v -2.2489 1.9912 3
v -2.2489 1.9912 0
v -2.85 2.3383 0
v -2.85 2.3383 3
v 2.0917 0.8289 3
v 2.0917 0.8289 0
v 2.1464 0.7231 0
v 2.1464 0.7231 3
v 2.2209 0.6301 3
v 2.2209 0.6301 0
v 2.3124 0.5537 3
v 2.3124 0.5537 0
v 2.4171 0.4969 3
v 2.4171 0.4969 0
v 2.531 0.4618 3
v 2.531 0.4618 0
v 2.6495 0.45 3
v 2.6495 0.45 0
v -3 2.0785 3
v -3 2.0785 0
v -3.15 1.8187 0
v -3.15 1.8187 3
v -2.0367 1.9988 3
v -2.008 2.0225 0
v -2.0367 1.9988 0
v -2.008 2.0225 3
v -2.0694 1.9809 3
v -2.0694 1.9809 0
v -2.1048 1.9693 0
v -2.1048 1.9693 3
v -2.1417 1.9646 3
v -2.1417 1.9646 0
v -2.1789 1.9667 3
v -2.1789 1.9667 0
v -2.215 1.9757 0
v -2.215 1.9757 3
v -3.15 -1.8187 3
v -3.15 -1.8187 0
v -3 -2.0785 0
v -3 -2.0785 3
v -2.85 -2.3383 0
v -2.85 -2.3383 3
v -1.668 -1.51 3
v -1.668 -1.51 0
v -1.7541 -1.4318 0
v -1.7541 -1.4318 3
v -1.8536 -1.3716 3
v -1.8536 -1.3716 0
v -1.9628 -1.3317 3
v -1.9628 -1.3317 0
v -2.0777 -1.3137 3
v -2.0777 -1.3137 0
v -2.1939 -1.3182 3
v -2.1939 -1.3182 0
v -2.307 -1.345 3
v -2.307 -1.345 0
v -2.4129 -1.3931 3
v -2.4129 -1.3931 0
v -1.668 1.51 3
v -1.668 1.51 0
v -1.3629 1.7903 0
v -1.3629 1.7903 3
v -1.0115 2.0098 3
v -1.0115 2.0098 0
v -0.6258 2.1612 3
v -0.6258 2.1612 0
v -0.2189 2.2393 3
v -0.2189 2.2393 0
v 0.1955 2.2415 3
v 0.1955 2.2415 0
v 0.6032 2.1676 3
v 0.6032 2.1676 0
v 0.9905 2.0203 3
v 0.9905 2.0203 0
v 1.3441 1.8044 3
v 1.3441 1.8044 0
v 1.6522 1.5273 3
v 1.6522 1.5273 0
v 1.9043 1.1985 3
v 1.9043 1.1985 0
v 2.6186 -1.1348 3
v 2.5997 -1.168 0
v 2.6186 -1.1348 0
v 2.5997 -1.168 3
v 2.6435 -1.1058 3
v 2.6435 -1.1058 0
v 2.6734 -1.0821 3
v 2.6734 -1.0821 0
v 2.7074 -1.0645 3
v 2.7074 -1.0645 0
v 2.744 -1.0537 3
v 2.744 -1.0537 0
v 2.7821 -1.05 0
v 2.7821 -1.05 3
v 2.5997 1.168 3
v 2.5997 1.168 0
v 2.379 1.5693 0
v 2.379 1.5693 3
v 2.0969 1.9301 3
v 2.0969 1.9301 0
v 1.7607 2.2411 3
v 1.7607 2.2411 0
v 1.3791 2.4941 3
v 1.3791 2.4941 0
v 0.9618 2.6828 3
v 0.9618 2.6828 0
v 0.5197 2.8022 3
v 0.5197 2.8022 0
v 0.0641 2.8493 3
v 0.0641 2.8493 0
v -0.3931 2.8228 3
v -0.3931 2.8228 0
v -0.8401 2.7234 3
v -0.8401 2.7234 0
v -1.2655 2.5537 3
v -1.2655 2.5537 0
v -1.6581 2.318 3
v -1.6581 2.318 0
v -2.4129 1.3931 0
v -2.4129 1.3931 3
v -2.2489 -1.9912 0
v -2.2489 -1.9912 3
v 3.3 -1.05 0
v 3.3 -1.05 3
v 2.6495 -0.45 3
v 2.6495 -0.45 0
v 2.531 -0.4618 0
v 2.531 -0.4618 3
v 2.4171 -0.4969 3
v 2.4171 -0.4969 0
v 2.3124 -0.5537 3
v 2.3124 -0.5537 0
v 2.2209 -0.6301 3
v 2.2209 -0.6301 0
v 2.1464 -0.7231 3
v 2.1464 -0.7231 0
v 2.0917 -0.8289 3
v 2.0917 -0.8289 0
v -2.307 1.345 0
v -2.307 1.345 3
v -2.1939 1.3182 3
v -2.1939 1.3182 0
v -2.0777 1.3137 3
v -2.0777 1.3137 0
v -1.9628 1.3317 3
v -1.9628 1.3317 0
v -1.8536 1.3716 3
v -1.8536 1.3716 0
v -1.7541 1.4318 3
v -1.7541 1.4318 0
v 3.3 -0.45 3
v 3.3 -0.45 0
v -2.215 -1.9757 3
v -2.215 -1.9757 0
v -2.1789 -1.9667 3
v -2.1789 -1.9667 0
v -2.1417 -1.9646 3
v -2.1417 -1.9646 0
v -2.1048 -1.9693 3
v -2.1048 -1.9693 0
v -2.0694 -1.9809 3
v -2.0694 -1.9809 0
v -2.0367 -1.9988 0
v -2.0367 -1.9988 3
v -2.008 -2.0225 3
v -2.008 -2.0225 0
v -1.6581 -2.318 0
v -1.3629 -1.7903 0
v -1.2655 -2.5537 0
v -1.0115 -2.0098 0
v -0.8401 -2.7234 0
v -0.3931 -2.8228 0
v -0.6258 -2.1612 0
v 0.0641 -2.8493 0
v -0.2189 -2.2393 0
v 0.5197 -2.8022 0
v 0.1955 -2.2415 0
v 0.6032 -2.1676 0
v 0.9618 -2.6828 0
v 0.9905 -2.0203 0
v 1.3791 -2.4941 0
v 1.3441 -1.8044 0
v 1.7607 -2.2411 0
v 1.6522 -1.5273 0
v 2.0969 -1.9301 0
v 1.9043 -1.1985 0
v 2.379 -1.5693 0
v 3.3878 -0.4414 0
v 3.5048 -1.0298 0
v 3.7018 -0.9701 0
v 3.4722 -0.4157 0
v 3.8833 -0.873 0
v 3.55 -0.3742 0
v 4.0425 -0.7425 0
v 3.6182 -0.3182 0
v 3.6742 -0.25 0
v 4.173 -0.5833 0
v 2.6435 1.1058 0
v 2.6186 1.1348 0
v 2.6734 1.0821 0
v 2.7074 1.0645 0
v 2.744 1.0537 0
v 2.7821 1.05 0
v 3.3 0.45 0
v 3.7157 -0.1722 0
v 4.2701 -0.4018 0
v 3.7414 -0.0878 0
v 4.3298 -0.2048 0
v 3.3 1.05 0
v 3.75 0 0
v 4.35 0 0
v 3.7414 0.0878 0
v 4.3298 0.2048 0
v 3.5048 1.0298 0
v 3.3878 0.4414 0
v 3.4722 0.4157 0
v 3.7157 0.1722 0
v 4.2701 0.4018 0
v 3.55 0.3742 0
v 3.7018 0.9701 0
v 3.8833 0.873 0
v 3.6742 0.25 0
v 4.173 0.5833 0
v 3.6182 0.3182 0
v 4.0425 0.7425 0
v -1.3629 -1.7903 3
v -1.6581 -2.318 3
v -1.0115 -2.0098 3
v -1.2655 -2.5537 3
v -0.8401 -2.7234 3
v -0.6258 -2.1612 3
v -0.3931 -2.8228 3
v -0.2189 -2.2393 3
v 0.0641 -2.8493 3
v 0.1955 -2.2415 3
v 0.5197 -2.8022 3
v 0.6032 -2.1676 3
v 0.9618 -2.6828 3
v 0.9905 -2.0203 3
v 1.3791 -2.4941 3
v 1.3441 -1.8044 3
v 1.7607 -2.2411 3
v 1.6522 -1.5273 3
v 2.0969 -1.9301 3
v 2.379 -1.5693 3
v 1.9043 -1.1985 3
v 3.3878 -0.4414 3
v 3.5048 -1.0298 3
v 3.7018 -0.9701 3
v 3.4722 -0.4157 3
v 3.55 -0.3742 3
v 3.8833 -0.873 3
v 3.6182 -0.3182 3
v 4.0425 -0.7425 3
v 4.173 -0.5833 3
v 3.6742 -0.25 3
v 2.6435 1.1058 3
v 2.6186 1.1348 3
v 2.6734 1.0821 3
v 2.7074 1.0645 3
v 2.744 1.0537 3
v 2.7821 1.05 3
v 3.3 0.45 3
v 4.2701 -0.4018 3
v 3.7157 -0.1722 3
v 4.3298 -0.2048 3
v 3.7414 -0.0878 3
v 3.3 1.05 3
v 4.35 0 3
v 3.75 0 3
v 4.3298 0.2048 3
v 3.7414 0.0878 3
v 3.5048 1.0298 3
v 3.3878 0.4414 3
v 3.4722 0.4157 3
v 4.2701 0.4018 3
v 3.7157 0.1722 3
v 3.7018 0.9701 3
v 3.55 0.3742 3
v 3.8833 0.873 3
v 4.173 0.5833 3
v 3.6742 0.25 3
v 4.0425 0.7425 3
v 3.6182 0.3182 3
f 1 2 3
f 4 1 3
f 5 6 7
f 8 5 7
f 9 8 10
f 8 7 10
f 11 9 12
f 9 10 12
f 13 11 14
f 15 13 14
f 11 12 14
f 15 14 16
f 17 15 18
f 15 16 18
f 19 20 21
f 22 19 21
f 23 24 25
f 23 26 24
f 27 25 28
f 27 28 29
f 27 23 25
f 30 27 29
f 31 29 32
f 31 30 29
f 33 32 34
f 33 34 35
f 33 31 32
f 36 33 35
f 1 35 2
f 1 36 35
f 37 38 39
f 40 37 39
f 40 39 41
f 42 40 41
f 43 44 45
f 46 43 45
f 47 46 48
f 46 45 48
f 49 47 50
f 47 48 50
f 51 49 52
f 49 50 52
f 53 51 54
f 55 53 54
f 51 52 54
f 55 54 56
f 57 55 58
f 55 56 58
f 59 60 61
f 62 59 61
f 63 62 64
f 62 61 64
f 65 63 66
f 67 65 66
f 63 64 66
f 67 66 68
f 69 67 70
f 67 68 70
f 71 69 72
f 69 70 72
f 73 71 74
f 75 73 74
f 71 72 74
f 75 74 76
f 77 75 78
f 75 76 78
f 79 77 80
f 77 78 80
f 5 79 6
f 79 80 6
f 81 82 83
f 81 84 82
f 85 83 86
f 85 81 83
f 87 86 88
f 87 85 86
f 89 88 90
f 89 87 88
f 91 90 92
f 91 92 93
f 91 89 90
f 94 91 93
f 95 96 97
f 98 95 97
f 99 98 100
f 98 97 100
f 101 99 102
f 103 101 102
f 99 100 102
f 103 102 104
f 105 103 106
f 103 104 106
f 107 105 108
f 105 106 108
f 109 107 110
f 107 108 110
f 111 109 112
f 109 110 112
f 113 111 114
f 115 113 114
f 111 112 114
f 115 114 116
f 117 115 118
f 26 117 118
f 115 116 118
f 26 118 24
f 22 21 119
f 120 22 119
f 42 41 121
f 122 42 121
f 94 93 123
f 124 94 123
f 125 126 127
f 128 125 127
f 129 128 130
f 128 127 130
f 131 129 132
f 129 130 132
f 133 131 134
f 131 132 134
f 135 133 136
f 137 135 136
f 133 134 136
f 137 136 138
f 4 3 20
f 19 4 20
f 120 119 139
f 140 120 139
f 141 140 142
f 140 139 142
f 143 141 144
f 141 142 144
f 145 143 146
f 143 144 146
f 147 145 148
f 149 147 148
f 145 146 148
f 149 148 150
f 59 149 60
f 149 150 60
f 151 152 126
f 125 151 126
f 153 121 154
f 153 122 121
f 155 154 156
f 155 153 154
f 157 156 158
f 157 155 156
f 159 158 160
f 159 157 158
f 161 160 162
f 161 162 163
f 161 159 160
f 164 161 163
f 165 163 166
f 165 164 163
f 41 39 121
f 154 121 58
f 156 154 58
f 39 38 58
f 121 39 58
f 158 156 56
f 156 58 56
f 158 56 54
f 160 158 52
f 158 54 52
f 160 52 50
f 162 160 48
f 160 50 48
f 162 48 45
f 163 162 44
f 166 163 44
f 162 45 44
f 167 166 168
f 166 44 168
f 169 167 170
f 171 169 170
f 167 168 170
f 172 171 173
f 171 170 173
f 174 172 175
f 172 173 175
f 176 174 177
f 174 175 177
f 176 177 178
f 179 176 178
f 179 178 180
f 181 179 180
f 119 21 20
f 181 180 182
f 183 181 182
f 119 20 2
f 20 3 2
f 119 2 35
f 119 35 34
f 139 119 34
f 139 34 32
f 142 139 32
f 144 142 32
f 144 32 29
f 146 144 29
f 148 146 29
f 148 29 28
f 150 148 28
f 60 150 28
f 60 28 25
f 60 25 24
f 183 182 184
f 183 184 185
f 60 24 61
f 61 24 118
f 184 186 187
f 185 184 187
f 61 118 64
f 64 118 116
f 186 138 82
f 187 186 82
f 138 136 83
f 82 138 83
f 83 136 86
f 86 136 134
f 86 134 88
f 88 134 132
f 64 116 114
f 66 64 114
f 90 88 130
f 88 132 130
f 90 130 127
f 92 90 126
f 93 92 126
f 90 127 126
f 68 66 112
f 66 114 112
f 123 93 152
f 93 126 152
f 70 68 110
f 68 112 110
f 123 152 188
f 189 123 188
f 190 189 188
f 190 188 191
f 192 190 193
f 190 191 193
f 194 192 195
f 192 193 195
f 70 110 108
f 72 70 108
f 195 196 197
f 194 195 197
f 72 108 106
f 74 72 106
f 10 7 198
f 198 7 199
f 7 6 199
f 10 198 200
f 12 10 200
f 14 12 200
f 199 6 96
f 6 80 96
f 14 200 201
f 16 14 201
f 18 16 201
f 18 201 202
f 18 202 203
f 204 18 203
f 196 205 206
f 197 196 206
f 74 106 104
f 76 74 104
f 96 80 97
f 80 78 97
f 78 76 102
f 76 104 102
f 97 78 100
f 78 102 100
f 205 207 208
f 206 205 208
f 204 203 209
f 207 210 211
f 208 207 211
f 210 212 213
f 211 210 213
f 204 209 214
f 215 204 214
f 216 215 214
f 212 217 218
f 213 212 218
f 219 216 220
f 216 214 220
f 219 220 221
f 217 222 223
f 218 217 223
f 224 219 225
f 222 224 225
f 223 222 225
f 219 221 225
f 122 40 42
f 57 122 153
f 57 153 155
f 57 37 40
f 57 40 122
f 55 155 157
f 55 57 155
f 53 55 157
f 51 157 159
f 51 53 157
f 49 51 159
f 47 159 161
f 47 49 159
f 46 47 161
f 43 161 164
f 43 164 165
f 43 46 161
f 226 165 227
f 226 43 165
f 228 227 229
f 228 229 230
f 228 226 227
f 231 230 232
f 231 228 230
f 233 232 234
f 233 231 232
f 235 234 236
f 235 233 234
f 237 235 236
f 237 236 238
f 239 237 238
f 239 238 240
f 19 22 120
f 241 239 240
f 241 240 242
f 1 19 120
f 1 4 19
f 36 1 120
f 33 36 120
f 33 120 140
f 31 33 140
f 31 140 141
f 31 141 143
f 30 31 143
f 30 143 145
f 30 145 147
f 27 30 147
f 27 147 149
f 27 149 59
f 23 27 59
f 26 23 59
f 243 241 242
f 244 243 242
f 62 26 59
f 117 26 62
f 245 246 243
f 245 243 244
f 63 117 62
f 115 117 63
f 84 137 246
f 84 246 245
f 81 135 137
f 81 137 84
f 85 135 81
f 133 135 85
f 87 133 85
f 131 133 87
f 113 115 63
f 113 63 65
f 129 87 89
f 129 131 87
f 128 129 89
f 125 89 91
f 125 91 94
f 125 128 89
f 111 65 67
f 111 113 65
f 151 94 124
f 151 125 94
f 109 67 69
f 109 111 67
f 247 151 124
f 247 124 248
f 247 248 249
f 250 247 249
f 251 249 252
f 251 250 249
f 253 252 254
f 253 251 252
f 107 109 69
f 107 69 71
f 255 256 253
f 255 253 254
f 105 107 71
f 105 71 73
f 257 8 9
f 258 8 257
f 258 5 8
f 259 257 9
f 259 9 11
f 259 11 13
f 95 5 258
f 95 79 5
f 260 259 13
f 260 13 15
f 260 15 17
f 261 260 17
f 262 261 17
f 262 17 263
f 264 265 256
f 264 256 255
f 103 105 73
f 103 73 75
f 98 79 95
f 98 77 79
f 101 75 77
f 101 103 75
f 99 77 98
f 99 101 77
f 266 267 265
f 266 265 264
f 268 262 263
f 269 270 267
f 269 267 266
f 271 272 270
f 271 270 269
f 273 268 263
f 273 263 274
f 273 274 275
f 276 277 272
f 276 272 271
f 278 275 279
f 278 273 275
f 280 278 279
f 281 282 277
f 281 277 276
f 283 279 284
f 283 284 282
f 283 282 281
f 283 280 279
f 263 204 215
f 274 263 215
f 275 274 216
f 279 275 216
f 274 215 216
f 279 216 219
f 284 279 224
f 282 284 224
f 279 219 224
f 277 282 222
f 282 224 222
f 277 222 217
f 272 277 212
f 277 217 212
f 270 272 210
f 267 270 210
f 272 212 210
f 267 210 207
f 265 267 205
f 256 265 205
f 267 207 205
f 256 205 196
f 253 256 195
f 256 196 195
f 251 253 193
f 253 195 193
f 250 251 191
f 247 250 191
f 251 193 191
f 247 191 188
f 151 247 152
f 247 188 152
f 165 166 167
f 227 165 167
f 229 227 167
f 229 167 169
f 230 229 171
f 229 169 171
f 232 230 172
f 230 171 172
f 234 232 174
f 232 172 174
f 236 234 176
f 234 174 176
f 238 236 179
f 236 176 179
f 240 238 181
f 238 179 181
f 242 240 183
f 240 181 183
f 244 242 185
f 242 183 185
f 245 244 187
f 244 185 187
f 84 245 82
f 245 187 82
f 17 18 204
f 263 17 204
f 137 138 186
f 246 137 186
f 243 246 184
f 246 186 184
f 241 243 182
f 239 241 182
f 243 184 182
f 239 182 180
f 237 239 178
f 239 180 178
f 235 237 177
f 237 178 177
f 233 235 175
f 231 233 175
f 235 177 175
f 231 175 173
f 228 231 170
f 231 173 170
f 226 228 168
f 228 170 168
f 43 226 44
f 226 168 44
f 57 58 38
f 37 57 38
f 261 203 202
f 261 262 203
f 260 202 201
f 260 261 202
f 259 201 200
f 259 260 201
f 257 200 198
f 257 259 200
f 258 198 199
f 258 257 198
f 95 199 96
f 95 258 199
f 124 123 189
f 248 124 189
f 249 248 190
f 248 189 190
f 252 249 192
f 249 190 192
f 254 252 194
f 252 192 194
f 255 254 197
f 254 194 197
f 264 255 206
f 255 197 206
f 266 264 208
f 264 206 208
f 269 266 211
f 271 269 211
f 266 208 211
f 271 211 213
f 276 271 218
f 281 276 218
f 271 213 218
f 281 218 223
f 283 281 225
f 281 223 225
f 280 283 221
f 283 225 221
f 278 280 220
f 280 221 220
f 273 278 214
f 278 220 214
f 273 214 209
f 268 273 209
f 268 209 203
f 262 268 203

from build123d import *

# Parameters (mm, degrees)
F1_DEPTH = 1
F2_SCALE = 3
F3_R     = 0.2


with BuildPart() as f1:
    # F0 (on Top) → F1 (new body)
    with BuildSketch(Plane.XY):
        with BuildLine():
            ThreePointArc((-0.5560147872, 0.5033364247), (0.1336825888, 0.7379898139), (0.6972442789, 0.2763157895))
            ThreePointArc((0.6972442789, 0.2763157895), (0.7707857892, 0.1845659616), (0.8831760866, 0.15))
            Line((0.8831760866, 0.15), (1.1, 0.15))
            ThreePointArc((1.1, 0.15), (1.25, 0), (1.1, -0.15))
            Line((1.1, -0.15), (0.8831760866, -0.15))
            ThreePointArc((0.8831760866, -0.15), (0.7707857892, -0.1845659616), (0.6972442789, -0.2763157895))
            ThreePointArc((0.6972442789, -0.2763157895), (0.1336825888, -0.7379898139), (-0.5560147872, -0.5033364247))
            ThreePointArc((-0.5560147872, -0.5033364247), (-0.6732626201, -0.4399801523), (-0.8042853971, -0.4643543905))
            Line((-0.8042853971, -0.4643543905), (-1.05, -0.6062177826))
            Line((-1.05, -0.6062177826), (-1, -0.692820323))
            Line((-1, -0.692820323), (-0.7542853971, -0.5509569309))
            ThreePointArc((-0.7542853971, -0.5509569309), (-0.6887740086, -0.5387698118), (-0.6301500921, -0.570447948))
            ThreePointArc((-0.6301500921, -0.570447948), (0.1515069339, -0.8363884558), (0.7902101828, -0.3131578947))
            ThreePointArc((0.7902101828, -0.3131578947), (0.8269809379, -0.2672829808), (0.8831760866, -0.25))
            Line((0.8831760866, -0.25), (1.1, -0.25))
            ThreePointArc((1.1, -0.25), (1.35, 0), (1.1, 0.25))
            Line((1.1, 0.25), (0.8831760866, 0.25))
            ThreePointArc((0.8831760866, 0.25), (0.8269809379, 0.2672829808), (0.7902101828, 0.3131578947))
            ThreePointArc((0.7902101828, 0.3131578947), (0.1515069339, 0.8363884558), (-0.6301500921, 0.570447948))
            ThreePointArc((-0.6301500921, 0.570447948), (-0.6887740086, 0.5387698118), (-0.7542853971, 0.5509569309))
            Line((-0.7542853971, 0.5509569309), (-1, 0.692820323))
            Line((-1, 0.692820323), (-1.05, 0.6062177826))
            Line((-1.05, 0.6062177826), (-0.8042853971, 0.4643543905))
            ThreePointArc((-0.8042853971, 0.4643543905), (-0.6732626201, 0.4399801523), (-0.5560147872, 0.5033364247))
        make_face()
        with BuildLine():
            Line((-0.949999984, 0.7794228911), (-1, 0.692820323))
            Line((-1, 0.692820323), (-0.7542853971, 0.5509569309))
            ThreePointArc((-0.7542853971, 0.5509569309), (-0.6887740086, 0.5387698118), (-0.6301500921, 0.570447948))
            ThreePointArc((-0.6301500921, 0.570447948), (0.1515069339, 0.8363884558), (0.7902101828, 0.3131578947))
            ThreePointArc((0.7902101828, 0.3131578947), (0.8269809379, 0.2672829808), (0.8831760866, 0.25))
            Line((0.8831760866, 0.25), (1.1, 0.25))
            ThreePointArc((1.1, 0.25), (1.35, 0), (1.1, -0.25))
            Line((1.1, -0.25), (0.8831760866, -0.25))
            ThreePointArc((0.8831760866, -0.25), (0.8269809379, -0.2672829808), (0.7902101828, -0.3131578947))
            ThreePointArc((0.7902101828, -0.3131578947), (0.1515069339, -0.8363884558), (-0.6301500921, -0.570447948))
            ThreePointArc((-0.6301500921, -0.570447948), (-0.6887740086, -0.5387698118), (-0.7542853971, -0.5509569309))
            Line((-0.7542853971, -0.5509569309), (-1, -0.692820323))
            Line((-1, -0.692820323), (-0.949999984, -0.7794228911))
            Line((-0.949999984, -0.7794228911), (-0.7042854035, -0.6375595118))
            ThreePointArc((-0.7042854035, -0.6375595118), (0.1693312868, -0.9347871287), (0.8831761083, -0.3500000319))
            Line((0.8831761083, -0.3500000319), (1.1, -0.3500000319))
            ThreePointArc((1.1, -0.3500000319), (1.4500000319, 0), (1.1, 0.3500000319))
            Line((1.1, 0.3500000319), (0.8831761083, 0.3500000319))
            ThreePointArc((0.8831761083, 0.3500000319), (0.1693312868, 0.9347871287), (-0.7042854035, 0.6375595118))
            Line((-0.7042854035, 0.6375595118), (-0.949999984, 0.7794228911))
        make_face()
    extrude(amount=F1_DEPTH)


with BuildPart() as f1_1:
    # F2: moved
    add(f1.part.scale(F2_SCALE))

    # F3
    f3_edges = [f1_1.edges().sort_by_distance(p)[0] for p in [
        (-2.112856, 1.912679, 1.5),
        (-2.112856, -1.912679, 1.5),
        (2.649528, -1.05, 1.5),
        (2.649528, 1.05, 1.5),
    ]]
    fillet(f3_edges, radius=F3_R)


solid = f1_1.part
